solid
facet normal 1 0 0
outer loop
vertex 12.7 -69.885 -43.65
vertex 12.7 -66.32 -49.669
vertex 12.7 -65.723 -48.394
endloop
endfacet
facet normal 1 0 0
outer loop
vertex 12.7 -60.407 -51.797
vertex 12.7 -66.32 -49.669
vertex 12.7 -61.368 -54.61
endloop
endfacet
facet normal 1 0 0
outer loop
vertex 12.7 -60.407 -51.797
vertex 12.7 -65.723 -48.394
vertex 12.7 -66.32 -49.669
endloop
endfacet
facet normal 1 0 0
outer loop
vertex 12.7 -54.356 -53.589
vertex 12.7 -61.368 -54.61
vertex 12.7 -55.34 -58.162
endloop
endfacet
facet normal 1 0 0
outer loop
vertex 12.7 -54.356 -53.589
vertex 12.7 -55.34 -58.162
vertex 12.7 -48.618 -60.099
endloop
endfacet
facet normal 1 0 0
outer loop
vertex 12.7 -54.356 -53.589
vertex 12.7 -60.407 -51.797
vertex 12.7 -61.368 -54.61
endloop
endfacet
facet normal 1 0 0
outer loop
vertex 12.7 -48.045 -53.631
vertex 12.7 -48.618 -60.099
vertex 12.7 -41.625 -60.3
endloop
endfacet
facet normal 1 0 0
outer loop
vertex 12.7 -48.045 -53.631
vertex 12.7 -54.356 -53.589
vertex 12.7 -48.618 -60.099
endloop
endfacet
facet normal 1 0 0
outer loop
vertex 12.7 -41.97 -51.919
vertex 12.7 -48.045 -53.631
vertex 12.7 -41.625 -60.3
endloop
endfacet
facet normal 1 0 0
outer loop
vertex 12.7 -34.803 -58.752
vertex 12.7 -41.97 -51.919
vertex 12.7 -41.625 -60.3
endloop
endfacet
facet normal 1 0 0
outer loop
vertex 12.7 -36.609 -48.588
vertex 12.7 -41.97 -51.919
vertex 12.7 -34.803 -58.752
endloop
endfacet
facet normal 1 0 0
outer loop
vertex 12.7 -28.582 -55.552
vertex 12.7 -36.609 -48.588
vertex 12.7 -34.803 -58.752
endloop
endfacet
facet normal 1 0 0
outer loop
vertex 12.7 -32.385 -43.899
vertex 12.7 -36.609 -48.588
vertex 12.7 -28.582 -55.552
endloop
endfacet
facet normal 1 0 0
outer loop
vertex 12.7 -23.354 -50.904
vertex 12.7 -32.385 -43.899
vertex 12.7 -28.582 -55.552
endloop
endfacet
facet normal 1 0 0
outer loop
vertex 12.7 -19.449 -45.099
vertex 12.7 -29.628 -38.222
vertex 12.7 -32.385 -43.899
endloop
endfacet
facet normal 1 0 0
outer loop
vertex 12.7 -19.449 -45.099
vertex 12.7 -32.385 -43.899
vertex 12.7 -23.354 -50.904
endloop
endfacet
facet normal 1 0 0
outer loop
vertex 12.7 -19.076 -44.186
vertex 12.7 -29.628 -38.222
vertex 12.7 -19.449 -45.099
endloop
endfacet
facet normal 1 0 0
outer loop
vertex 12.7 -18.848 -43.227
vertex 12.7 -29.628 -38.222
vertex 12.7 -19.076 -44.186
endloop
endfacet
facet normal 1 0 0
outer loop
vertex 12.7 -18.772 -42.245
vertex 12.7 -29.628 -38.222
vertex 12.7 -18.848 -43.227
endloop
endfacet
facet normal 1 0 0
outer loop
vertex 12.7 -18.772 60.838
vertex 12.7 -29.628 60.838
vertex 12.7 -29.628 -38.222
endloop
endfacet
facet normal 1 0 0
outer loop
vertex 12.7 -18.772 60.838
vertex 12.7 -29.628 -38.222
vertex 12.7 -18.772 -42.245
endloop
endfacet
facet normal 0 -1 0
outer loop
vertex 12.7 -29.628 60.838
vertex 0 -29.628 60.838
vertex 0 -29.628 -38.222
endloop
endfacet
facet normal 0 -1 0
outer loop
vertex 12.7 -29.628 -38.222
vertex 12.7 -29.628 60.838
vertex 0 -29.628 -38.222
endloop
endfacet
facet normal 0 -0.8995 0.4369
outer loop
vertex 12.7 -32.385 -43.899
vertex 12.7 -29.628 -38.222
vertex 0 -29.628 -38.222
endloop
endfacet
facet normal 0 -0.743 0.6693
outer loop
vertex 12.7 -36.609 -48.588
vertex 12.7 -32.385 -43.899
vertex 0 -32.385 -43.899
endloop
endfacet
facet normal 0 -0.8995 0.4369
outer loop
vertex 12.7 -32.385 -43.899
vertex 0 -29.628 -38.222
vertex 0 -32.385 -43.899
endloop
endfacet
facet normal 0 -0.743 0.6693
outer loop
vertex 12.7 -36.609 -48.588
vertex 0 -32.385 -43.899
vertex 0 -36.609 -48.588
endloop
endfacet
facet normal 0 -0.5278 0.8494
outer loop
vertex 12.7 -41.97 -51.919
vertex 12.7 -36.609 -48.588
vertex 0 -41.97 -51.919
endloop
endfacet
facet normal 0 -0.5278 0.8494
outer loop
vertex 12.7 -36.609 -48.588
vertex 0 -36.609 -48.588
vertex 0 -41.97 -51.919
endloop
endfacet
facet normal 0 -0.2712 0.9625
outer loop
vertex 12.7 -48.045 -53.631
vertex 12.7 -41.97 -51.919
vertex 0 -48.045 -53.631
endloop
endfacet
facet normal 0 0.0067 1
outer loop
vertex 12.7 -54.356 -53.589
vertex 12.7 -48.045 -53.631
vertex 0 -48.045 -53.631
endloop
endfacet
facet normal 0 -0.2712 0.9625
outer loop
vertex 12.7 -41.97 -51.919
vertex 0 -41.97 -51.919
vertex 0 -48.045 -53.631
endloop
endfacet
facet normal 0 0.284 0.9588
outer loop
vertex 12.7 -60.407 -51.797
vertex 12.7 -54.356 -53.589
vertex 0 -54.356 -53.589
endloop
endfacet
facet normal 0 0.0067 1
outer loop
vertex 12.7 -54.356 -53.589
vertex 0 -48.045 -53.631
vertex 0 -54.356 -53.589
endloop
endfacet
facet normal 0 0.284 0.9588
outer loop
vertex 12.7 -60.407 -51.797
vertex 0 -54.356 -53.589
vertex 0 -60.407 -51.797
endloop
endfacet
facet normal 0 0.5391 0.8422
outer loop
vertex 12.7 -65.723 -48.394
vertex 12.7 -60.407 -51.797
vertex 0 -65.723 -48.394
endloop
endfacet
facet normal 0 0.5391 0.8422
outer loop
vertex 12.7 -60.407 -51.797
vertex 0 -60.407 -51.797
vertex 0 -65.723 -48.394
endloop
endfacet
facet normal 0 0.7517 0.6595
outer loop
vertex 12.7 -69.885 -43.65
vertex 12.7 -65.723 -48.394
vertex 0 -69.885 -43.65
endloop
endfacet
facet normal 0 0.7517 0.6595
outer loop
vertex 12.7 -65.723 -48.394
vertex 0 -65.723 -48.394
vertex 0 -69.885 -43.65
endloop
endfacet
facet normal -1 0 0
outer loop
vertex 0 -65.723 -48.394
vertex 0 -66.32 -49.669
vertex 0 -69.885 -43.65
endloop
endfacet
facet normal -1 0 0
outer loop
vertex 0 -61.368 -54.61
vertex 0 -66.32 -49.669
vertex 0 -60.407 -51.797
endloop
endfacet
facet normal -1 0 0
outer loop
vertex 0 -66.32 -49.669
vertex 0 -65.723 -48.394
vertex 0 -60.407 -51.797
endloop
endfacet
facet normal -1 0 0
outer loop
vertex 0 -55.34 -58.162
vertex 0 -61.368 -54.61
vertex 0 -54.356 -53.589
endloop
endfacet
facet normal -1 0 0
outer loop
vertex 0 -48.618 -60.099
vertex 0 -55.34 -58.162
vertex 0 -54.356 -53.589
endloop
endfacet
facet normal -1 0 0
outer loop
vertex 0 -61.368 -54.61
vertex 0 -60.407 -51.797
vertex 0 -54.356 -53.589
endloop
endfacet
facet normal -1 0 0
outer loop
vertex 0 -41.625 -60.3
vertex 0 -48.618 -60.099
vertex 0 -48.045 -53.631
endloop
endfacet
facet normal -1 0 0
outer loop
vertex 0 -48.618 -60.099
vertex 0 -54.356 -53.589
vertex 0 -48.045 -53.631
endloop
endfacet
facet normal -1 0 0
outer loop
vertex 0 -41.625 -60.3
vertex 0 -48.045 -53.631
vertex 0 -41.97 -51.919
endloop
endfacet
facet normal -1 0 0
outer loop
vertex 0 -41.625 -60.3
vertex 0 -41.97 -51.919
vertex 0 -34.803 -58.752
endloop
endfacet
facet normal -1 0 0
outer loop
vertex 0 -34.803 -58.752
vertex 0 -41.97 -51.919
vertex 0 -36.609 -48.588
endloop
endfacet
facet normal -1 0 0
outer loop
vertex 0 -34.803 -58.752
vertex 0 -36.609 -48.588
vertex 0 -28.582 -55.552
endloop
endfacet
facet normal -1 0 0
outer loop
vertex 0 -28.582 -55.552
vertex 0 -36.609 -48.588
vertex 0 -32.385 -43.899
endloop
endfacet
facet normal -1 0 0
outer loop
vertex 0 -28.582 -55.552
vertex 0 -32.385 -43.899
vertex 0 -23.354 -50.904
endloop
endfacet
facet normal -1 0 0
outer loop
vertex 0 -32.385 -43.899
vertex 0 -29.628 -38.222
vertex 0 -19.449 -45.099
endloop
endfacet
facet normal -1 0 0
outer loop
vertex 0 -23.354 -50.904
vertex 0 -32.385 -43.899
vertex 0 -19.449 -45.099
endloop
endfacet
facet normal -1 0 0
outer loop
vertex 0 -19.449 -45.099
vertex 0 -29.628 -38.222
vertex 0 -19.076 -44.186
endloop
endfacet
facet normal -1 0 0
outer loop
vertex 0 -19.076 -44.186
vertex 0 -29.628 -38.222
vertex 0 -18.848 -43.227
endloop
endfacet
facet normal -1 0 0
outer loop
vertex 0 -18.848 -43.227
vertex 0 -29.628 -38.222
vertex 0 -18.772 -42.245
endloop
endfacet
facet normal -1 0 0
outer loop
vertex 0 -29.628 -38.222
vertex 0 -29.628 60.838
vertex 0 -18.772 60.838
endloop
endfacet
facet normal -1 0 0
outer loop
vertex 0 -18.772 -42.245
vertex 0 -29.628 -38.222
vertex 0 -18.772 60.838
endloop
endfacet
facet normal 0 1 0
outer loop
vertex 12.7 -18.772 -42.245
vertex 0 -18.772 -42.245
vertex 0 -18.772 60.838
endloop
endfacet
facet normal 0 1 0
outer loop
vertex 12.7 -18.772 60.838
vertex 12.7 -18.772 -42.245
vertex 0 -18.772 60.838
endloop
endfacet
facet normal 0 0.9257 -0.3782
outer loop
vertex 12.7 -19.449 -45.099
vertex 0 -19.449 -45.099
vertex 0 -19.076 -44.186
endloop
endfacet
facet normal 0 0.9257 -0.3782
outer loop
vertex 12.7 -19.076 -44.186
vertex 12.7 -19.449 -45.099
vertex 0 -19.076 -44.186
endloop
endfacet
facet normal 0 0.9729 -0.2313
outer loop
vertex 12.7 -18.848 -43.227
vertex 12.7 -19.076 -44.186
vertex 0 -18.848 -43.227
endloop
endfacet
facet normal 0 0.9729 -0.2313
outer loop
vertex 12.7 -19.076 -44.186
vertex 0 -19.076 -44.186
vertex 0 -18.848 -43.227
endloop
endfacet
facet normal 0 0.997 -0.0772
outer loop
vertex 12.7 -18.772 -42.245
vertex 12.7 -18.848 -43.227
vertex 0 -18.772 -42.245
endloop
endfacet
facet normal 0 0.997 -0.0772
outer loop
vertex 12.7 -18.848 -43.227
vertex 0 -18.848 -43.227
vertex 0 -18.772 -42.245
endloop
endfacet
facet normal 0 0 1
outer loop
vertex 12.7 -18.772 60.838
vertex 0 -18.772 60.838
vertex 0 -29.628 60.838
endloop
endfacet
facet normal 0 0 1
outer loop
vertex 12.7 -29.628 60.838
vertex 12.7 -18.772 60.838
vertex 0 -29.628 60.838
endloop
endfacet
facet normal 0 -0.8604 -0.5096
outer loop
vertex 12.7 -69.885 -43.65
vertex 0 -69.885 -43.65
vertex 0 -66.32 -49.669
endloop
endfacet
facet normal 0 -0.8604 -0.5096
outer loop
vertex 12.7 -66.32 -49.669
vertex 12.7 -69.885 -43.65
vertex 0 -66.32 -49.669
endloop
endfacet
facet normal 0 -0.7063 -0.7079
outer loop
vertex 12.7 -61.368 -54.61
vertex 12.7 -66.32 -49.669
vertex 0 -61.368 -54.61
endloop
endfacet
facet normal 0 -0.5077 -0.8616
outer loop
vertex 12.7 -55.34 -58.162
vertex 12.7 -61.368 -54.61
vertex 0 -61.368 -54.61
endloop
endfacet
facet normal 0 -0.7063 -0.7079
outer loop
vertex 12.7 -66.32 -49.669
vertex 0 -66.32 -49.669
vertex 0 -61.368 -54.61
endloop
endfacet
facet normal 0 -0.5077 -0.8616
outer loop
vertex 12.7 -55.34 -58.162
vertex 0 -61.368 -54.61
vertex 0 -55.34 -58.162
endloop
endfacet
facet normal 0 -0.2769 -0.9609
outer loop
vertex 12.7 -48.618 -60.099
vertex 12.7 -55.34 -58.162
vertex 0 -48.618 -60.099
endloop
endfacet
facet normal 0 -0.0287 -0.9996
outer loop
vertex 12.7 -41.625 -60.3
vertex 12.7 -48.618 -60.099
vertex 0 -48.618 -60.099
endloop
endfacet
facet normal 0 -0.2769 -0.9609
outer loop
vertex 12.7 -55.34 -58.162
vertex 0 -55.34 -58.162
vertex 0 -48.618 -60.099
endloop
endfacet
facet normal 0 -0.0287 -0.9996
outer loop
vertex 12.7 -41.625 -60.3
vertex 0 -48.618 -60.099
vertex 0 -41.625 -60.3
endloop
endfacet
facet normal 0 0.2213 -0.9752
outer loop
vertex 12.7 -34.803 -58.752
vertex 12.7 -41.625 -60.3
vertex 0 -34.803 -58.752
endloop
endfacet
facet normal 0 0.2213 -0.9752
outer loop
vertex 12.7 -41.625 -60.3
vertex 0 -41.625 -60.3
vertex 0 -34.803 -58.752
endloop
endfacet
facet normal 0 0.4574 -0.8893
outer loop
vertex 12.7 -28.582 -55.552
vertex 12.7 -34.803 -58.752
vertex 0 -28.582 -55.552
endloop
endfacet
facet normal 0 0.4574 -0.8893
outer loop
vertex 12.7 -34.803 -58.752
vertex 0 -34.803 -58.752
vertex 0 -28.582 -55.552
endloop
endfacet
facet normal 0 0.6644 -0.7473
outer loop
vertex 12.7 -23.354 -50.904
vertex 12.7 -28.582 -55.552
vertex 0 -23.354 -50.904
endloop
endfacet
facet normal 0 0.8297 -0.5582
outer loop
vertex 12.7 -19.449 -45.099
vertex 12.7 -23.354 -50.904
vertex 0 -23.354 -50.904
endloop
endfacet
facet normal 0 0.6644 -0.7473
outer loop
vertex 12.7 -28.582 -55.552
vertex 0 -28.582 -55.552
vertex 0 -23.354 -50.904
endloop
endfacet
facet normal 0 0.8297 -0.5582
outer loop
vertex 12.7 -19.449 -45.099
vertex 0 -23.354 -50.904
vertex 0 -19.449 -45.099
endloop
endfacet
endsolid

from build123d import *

# Parameters (mm, degrees)
F1_DEPTH = 12.7


with BuildPart() as f1:
    # F0 (on Right) → F1 (new body)
    with BuildSketch(Plane.YZ):
        with BuildLine():
            Line((-18.77171, -42.24451), (-18.77171, 60.838442))
            Line((-18.77171, 60.838442), (-29.627644, 60.838442))
            Line((-29.627644, 60.838442), (-29.627644, -38.221922))
            ThreePointArc((-29.627644, -38.221922), (-48.0446, -53.631362), (-69.885053, -43.64989))
            ThreePointArc((-69.885053, -43.64989), (-45.128132, -60.419661), (-19.449341, -45.098757))
            ThreePointArc((-19.449341, -45.098757), (-18.94344, -43.711302), (-18.77171, -42.24451))
        make_face()
    extrude(amount=F1_DEPTH)


solid = f1.part
